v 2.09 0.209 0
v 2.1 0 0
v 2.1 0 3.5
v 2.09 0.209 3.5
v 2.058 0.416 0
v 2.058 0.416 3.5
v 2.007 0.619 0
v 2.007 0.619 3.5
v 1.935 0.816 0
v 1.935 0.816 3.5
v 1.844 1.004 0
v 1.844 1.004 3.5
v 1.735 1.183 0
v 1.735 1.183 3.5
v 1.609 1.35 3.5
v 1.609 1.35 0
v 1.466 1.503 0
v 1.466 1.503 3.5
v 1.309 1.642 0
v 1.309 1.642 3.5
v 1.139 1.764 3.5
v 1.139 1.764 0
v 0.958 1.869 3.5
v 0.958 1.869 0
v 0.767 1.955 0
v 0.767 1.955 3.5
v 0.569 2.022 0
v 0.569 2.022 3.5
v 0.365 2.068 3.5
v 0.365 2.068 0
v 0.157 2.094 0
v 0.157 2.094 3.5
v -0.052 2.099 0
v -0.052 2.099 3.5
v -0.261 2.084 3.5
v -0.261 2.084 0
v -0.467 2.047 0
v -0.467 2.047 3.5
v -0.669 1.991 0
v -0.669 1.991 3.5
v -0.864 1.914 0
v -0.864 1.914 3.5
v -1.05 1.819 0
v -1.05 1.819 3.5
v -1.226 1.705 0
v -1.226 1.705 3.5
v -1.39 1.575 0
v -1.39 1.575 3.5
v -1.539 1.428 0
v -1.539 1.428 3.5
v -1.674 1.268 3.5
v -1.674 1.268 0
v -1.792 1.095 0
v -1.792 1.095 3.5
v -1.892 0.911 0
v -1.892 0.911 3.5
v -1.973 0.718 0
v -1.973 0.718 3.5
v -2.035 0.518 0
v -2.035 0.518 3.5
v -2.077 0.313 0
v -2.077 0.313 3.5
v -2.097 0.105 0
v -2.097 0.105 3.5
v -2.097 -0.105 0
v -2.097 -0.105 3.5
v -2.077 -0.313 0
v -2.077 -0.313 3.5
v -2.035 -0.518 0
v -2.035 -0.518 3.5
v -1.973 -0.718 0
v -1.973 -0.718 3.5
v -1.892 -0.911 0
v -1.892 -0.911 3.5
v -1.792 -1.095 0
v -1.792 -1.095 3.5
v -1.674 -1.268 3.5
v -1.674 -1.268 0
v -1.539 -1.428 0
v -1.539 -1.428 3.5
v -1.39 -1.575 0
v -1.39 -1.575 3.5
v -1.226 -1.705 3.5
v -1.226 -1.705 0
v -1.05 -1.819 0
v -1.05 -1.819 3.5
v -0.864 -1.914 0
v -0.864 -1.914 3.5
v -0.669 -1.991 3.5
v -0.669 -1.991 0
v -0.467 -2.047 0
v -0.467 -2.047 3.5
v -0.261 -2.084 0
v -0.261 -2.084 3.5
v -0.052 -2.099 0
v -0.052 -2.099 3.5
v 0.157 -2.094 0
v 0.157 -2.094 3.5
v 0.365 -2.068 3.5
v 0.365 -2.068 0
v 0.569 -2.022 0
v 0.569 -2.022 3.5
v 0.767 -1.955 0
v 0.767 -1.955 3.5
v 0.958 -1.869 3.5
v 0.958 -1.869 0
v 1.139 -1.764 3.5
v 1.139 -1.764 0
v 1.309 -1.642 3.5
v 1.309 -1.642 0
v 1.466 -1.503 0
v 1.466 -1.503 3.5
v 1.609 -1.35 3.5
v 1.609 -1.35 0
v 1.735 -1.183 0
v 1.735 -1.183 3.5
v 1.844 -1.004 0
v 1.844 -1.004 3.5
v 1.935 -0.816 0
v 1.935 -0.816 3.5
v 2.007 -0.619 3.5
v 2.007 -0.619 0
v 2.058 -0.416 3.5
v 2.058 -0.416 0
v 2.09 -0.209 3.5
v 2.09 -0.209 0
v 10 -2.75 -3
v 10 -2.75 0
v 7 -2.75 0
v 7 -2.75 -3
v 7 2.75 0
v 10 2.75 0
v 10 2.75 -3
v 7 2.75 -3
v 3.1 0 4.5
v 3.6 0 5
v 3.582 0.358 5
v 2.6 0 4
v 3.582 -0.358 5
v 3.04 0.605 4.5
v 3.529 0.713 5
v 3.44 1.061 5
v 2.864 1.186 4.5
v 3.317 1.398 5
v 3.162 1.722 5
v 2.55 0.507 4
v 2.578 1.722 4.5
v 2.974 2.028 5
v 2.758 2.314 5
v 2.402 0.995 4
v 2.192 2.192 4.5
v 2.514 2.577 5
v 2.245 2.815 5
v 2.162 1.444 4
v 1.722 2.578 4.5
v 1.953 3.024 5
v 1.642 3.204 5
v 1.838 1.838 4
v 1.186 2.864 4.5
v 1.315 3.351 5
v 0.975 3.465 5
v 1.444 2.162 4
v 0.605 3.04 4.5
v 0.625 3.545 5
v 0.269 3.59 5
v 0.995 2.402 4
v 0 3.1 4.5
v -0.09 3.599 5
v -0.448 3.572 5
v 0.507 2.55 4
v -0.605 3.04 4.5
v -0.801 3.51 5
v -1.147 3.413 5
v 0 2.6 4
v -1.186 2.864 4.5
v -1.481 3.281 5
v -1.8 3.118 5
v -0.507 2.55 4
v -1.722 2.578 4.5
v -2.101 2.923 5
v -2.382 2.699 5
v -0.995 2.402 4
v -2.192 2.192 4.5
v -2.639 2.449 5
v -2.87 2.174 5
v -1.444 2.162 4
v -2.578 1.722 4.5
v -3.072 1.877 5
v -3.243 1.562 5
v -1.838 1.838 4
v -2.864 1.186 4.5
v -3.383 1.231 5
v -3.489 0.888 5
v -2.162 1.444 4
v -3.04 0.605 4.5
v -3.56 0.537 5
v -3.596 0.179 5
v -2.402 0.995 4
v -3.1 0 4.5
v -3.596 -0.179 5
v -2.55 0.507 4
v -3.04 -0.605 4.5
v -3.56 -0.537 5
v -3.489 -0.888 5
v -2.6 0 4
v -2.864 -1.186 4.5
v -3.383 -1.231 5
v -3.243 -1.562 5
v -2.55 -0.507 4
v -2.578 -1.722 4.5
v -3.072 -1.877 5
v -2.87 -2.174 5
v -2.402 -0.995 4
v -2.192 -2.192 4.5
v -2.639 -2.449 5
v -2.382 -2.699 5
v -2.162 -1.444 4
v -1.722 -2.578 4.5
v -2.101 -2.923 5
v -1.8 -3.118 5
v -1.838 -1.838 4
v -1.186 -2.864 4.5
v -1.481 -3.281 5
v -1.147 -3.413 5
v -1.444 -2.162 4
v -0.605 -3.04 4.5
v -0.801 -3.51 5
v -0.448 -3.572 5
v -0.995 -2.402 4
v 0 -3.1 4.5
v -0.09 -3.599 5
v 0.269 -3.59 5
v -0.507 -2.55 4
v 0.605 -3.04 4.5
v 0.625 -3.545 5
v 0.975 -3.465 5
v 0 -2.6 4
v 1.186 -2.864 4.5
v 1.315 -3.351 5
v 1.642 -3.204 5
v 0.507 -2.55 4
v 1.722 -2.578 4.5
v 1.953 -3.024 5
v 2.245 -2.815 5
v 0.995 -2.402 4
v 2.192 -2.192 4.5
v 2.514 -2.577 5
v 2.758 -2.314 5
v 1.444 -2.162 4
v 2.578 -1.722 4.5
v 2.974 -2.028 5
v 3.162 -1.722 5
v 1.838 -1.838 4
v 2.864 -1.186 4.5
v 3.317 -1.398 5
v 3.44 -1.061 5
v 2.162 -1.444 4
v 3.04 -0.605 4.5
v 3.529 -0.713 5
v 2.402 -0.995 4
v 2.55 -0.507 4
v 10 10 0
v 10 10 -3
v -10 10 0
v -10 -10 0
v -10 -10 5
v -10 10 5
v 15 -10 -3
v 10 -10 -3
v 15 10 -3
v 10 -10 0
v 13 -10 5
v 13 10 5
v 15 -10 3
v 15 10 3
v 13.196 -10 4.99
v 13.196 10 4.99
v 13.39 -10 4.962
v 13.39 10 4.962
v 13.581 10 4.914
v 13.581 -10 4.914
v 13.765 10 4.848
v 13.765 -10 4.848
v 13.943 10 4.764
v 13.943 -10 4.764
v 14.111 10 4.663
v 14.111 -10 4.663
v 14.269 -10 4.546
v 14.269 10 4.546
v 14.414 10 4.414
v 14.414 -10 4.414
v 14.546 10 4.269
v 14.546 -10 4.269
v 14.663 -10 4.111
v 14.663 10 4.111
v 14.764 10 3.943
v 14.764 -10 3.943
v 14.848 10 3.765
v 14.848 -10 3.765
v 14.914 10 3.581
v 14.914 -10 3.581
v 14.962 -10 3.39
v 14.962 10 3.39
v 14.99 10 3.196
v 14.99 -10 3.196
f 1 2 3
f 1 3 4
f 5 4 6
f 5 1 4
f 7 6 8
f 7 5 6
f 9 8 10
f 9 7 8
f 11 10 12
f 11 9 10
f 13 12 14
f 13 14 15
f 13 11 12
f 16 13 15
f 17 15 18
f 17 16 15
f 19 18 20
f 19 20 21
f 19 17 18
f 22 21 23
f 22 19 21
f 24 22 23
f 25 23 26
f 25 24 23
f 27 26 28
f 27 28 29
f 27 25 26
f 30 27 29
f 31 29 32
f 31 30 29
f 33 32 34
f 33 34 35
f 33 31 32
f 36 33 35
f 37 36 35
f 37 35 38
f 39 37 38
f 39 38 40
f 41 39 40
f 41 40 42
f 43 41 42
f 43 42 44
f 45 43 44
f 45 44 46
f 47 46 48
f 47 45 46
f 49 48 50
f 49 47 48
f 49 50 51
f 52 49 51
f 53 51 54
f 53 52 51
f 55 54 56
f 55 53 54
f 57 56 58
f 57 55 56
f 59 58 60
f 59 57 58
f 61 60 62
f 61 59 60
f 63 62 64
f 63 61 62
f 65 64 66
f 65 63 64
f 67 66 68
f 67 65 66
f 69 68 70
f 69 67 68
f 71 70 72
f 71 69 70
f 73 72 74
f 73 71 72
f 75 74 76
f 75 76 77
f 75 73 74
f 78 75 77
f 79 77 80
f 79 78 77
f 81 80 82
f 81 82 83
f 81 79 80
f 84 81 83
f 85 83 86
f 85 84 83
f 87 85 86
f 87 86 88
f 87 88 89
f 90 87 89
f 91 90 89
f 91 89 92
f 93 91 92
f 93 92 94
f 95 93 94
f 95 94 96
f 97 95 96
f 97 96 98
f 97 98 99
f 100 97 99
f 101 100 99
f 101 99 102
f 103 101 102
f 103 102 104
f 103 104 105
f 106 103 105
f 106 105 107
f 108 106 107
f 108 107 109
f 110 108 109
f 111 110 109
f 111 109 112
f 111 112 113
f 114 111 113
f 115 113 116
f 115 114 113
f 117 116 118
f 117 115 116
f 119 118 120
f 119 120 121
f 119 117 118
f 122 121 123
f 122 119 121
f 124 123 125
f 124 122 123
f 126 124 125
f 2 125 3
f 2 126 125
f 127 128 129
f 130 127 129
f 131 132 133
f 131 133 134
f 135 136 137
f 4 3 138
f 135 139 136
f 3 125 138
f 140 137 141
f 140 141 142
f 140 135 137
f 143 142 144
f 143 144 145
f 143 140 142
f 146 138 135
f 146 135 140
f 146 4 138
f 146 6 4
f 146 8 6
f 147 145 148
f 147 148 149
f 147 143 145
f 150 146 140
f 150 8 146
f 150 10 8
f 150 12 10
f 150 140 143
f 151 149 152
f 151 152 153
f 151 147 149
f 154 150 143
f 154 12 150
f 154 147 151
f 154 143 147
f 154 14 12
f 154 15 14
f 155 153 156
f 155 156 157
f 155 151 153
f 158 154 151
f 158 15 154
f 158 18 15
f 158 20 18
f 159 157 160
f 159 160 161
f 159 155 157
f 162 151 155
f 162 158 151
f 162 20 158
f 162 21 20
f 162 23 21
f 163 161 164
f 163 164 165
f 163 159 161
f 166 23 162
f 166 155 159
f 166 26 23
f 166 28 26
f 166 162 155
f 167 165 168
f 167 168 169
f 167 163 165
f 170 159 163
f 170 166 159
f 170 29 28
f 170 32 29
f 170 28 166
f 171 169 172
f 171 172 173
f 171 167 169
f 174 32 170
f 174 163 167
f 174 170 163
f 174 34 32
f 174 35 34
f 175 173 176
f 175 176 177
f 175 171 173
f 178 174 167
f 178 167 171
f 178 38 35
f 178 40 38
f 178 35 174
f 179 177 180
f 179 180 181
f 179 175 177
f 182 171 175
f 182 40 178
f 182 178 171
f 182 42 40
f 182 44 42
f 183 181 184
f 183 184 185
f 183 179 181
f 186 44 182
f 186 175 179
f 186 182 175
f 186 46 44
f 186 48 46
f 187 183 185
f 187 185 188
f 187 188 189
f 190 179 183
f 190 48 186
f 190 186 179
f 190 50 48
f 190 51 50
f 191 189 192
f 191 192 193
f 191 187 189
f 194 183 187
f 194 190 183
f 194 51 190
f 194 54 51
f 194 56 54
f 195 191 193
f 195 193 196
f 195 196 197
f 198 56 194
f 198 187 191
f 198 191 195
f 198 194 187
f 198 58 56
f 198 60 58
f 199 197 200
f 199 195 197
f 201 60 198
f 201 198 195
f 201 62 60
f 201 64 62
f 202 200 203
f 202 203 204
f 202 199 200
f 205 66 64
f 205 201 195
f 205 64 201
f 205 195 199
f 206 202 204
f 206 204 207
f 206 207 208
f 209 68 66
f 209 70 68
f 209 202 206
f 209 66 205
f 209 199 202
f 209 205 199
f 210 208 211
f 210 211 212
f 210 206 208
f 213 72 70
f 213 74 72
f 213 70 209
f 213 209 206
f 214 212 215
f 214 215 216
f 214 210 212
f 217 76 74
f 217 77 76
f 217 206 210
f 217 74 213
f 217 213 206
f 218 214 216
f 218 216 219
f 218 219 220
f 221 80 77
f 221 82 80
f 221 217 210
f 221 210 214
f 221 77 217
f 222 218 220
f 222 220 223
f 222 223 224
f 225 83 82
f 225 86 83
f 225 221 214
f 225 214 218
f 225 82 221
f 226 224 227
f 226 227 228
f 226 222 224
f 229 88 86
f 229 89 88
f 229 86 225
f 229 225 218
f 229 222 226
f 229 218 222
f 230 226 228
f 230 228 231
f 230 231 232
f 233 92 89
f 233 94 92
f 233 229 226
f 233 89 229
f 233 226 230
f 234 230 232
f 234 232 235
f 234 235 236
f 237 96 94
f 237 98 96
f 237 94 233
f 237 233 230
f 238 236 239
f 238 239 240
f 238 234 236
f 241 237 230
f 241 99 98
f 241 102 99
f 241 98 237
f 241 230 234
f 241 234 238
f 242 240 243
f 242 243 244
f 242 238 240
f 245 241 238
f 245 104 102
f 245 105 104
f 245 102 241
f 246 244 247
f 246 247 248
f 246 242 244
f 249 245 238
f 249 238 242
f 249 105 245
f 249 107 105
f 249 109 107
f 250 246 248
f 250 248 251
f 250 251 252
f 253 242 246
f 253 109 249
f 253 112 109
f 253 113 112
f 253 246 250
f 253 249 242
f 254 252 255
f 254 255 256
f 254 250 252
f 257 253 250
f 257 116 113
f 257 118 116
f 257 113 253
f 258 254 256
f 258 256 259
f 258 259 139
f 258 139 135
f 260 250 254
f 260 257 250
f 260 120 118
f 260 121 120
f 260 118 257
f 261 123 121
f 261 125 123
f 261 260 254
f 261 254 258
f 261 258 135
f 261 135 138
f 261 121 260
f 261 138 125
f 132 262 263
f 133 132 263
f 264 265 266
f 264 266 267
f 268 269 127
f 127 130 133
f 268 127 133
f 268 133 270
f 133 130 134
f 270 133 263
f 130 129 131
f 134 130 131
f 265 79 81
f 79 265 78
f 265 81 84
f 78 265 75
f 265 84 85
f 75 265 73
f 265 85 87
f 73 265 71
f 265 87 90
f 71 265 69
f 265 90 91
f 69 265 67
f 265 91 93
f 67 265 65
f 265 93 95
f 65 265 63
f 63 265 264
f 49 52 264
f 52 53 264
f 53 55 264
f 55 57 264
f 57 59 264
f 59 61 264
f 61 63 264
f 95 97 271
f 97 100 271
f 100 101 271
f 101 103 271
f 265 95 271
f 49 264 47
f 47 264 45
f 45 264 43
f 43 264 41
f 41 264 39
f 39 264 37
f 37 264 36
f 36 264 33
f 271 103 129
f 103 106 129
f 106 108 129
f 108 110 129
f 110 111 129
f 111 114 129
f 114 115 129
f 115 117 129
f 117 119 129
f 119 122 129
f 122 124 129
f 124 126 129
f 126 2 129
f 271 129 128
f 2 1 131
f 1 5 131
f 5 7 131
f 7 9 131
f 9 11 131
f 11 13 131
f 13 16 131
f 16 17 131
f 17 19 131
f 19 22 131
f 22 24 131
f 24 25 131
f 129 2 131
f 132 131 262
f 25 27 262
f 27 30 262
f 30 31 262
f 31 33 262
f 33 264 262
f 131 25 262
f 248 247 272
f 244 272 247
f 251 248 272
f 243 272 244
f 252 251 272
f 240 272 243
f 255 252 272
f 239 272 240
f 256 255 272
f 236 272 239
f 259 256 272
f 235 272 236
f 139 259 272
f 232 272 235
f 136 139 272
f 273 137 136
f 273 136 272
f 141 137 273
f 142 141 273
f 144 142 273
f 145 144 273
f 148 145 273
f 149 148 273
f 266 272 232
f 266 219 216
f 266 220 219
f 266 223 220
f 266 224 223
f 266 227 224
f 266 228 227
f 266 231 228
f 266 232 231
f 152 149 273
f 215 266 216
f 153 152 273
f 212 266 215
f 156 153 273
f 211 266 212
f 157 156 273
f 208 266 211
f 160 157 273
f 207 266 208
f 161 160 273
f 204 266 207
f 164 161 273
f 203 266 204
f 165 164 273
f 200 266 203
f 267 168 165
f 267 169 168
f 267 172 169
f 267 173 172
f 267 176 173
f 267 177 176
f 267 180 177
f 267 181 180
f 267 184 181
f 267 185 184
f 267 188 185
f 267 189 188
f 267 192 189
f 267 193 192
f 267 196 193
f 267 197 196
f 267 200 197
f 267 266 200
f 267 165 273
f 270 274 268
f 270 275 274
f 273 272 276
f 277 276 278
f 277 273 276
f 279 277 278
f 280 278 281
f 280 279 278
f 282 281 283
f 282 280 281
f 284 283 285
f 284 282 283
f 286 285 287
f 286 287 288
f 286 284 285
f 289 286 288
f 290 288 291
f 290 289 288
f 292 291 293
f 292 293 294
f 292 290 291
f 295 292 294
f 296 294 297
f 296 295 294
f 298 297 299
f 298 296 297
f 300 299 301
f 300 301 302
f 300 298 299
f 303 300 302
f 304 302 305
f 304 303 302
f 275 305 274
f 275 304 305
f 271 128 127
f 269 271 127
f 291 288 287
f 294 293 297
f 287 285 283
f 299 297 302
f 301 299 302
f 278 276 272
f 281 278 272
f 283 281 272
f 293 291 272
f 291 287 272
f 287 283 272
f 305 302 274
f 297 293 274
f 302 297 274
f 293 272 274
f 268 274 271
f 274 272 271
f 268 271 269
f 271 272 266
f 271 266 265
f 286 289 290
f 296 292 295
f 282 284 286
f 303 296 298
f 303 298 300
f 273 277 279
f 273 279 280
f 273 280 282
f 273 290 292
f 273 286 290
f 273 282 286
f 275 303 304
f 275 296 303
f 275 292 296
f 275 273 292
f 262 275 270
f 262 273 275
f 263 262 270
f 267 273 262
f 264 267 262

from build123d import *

# Parameters (mm, degrees)
SKETCH_2_W      = 20
SKETCH_2_H      = 20
SKETCH_2_R      = 2.1
EXTRUDE_1_DEPTH = 5
SKETCH_3_W      = 8
SKETCH_3_H      = 20
EXTRUDE_2_DEPTH = 5
FILLET_2_R      = 2
SKETCH_4_W      = 3
SKETCH_4_H      = 5.5
EXTRUDE_3_DEPTH = 3
CHAMFER_1_SIZE  = 1.5


with BuildPart() as part:
    # ｽｹｯﾁ2 → ﾎﾞｽ - 押し出し1 (new body)
    with BuildSketch(Plane.XY):
        Rectangle(SKETCH_2_W, SKETCH_2_H)
        Circle(SKETCH_2_R, mode=Mode.SUBTRACT)
    extrude(amount=EXTRUDE_1_DEPTH)

    # ｽｹｯﾁ3 → ﾎﾞｽ - 押し出し2 (add)
    with BuildSketch(Plane(origin=(10, 0, 0), x_dir=(0, 0, -1), z_dir=(1, 0, 0))):
        with Locations((-1, 0)):
            Rectangle(SKETCH_3_W, SKETCH_3_H)
    extrude(amount=EXTRUDE_2_DEPTH)

    # ﾌｨﾚｯﾄ2
    fillet_2_edges = [part.edges().sort_by_distance(p)[0] for p in [
        (15, 0, 5),
    ]]
    fillet(fillet_2_edges, radius=FILLET_2_R)

    # ｽｹｯﾁ4 → ﾎﾞｽ - 押し出し3 (add)
    with BuildSketch(Plane(origin=(0, 0, 0), x_dir=(-1, 0, 0), z_dir=(0, 0, -1))):
        with Locations((-8.5, 0)):
            Rectangle(SKETCH_4_W, SKETCH_4_H)
    extrude(amount=EXTRUDE_3_DEPTH)

    # 面取り1
    chamfer_1_edges = [part.edges().sort_by_distance(p)[0] for p in [
        (-2.1, 0, 5),
    ]]
    chamfer(chamfer_1_edges, length=CHAMFER_1_SIZE)


solid = part.part
